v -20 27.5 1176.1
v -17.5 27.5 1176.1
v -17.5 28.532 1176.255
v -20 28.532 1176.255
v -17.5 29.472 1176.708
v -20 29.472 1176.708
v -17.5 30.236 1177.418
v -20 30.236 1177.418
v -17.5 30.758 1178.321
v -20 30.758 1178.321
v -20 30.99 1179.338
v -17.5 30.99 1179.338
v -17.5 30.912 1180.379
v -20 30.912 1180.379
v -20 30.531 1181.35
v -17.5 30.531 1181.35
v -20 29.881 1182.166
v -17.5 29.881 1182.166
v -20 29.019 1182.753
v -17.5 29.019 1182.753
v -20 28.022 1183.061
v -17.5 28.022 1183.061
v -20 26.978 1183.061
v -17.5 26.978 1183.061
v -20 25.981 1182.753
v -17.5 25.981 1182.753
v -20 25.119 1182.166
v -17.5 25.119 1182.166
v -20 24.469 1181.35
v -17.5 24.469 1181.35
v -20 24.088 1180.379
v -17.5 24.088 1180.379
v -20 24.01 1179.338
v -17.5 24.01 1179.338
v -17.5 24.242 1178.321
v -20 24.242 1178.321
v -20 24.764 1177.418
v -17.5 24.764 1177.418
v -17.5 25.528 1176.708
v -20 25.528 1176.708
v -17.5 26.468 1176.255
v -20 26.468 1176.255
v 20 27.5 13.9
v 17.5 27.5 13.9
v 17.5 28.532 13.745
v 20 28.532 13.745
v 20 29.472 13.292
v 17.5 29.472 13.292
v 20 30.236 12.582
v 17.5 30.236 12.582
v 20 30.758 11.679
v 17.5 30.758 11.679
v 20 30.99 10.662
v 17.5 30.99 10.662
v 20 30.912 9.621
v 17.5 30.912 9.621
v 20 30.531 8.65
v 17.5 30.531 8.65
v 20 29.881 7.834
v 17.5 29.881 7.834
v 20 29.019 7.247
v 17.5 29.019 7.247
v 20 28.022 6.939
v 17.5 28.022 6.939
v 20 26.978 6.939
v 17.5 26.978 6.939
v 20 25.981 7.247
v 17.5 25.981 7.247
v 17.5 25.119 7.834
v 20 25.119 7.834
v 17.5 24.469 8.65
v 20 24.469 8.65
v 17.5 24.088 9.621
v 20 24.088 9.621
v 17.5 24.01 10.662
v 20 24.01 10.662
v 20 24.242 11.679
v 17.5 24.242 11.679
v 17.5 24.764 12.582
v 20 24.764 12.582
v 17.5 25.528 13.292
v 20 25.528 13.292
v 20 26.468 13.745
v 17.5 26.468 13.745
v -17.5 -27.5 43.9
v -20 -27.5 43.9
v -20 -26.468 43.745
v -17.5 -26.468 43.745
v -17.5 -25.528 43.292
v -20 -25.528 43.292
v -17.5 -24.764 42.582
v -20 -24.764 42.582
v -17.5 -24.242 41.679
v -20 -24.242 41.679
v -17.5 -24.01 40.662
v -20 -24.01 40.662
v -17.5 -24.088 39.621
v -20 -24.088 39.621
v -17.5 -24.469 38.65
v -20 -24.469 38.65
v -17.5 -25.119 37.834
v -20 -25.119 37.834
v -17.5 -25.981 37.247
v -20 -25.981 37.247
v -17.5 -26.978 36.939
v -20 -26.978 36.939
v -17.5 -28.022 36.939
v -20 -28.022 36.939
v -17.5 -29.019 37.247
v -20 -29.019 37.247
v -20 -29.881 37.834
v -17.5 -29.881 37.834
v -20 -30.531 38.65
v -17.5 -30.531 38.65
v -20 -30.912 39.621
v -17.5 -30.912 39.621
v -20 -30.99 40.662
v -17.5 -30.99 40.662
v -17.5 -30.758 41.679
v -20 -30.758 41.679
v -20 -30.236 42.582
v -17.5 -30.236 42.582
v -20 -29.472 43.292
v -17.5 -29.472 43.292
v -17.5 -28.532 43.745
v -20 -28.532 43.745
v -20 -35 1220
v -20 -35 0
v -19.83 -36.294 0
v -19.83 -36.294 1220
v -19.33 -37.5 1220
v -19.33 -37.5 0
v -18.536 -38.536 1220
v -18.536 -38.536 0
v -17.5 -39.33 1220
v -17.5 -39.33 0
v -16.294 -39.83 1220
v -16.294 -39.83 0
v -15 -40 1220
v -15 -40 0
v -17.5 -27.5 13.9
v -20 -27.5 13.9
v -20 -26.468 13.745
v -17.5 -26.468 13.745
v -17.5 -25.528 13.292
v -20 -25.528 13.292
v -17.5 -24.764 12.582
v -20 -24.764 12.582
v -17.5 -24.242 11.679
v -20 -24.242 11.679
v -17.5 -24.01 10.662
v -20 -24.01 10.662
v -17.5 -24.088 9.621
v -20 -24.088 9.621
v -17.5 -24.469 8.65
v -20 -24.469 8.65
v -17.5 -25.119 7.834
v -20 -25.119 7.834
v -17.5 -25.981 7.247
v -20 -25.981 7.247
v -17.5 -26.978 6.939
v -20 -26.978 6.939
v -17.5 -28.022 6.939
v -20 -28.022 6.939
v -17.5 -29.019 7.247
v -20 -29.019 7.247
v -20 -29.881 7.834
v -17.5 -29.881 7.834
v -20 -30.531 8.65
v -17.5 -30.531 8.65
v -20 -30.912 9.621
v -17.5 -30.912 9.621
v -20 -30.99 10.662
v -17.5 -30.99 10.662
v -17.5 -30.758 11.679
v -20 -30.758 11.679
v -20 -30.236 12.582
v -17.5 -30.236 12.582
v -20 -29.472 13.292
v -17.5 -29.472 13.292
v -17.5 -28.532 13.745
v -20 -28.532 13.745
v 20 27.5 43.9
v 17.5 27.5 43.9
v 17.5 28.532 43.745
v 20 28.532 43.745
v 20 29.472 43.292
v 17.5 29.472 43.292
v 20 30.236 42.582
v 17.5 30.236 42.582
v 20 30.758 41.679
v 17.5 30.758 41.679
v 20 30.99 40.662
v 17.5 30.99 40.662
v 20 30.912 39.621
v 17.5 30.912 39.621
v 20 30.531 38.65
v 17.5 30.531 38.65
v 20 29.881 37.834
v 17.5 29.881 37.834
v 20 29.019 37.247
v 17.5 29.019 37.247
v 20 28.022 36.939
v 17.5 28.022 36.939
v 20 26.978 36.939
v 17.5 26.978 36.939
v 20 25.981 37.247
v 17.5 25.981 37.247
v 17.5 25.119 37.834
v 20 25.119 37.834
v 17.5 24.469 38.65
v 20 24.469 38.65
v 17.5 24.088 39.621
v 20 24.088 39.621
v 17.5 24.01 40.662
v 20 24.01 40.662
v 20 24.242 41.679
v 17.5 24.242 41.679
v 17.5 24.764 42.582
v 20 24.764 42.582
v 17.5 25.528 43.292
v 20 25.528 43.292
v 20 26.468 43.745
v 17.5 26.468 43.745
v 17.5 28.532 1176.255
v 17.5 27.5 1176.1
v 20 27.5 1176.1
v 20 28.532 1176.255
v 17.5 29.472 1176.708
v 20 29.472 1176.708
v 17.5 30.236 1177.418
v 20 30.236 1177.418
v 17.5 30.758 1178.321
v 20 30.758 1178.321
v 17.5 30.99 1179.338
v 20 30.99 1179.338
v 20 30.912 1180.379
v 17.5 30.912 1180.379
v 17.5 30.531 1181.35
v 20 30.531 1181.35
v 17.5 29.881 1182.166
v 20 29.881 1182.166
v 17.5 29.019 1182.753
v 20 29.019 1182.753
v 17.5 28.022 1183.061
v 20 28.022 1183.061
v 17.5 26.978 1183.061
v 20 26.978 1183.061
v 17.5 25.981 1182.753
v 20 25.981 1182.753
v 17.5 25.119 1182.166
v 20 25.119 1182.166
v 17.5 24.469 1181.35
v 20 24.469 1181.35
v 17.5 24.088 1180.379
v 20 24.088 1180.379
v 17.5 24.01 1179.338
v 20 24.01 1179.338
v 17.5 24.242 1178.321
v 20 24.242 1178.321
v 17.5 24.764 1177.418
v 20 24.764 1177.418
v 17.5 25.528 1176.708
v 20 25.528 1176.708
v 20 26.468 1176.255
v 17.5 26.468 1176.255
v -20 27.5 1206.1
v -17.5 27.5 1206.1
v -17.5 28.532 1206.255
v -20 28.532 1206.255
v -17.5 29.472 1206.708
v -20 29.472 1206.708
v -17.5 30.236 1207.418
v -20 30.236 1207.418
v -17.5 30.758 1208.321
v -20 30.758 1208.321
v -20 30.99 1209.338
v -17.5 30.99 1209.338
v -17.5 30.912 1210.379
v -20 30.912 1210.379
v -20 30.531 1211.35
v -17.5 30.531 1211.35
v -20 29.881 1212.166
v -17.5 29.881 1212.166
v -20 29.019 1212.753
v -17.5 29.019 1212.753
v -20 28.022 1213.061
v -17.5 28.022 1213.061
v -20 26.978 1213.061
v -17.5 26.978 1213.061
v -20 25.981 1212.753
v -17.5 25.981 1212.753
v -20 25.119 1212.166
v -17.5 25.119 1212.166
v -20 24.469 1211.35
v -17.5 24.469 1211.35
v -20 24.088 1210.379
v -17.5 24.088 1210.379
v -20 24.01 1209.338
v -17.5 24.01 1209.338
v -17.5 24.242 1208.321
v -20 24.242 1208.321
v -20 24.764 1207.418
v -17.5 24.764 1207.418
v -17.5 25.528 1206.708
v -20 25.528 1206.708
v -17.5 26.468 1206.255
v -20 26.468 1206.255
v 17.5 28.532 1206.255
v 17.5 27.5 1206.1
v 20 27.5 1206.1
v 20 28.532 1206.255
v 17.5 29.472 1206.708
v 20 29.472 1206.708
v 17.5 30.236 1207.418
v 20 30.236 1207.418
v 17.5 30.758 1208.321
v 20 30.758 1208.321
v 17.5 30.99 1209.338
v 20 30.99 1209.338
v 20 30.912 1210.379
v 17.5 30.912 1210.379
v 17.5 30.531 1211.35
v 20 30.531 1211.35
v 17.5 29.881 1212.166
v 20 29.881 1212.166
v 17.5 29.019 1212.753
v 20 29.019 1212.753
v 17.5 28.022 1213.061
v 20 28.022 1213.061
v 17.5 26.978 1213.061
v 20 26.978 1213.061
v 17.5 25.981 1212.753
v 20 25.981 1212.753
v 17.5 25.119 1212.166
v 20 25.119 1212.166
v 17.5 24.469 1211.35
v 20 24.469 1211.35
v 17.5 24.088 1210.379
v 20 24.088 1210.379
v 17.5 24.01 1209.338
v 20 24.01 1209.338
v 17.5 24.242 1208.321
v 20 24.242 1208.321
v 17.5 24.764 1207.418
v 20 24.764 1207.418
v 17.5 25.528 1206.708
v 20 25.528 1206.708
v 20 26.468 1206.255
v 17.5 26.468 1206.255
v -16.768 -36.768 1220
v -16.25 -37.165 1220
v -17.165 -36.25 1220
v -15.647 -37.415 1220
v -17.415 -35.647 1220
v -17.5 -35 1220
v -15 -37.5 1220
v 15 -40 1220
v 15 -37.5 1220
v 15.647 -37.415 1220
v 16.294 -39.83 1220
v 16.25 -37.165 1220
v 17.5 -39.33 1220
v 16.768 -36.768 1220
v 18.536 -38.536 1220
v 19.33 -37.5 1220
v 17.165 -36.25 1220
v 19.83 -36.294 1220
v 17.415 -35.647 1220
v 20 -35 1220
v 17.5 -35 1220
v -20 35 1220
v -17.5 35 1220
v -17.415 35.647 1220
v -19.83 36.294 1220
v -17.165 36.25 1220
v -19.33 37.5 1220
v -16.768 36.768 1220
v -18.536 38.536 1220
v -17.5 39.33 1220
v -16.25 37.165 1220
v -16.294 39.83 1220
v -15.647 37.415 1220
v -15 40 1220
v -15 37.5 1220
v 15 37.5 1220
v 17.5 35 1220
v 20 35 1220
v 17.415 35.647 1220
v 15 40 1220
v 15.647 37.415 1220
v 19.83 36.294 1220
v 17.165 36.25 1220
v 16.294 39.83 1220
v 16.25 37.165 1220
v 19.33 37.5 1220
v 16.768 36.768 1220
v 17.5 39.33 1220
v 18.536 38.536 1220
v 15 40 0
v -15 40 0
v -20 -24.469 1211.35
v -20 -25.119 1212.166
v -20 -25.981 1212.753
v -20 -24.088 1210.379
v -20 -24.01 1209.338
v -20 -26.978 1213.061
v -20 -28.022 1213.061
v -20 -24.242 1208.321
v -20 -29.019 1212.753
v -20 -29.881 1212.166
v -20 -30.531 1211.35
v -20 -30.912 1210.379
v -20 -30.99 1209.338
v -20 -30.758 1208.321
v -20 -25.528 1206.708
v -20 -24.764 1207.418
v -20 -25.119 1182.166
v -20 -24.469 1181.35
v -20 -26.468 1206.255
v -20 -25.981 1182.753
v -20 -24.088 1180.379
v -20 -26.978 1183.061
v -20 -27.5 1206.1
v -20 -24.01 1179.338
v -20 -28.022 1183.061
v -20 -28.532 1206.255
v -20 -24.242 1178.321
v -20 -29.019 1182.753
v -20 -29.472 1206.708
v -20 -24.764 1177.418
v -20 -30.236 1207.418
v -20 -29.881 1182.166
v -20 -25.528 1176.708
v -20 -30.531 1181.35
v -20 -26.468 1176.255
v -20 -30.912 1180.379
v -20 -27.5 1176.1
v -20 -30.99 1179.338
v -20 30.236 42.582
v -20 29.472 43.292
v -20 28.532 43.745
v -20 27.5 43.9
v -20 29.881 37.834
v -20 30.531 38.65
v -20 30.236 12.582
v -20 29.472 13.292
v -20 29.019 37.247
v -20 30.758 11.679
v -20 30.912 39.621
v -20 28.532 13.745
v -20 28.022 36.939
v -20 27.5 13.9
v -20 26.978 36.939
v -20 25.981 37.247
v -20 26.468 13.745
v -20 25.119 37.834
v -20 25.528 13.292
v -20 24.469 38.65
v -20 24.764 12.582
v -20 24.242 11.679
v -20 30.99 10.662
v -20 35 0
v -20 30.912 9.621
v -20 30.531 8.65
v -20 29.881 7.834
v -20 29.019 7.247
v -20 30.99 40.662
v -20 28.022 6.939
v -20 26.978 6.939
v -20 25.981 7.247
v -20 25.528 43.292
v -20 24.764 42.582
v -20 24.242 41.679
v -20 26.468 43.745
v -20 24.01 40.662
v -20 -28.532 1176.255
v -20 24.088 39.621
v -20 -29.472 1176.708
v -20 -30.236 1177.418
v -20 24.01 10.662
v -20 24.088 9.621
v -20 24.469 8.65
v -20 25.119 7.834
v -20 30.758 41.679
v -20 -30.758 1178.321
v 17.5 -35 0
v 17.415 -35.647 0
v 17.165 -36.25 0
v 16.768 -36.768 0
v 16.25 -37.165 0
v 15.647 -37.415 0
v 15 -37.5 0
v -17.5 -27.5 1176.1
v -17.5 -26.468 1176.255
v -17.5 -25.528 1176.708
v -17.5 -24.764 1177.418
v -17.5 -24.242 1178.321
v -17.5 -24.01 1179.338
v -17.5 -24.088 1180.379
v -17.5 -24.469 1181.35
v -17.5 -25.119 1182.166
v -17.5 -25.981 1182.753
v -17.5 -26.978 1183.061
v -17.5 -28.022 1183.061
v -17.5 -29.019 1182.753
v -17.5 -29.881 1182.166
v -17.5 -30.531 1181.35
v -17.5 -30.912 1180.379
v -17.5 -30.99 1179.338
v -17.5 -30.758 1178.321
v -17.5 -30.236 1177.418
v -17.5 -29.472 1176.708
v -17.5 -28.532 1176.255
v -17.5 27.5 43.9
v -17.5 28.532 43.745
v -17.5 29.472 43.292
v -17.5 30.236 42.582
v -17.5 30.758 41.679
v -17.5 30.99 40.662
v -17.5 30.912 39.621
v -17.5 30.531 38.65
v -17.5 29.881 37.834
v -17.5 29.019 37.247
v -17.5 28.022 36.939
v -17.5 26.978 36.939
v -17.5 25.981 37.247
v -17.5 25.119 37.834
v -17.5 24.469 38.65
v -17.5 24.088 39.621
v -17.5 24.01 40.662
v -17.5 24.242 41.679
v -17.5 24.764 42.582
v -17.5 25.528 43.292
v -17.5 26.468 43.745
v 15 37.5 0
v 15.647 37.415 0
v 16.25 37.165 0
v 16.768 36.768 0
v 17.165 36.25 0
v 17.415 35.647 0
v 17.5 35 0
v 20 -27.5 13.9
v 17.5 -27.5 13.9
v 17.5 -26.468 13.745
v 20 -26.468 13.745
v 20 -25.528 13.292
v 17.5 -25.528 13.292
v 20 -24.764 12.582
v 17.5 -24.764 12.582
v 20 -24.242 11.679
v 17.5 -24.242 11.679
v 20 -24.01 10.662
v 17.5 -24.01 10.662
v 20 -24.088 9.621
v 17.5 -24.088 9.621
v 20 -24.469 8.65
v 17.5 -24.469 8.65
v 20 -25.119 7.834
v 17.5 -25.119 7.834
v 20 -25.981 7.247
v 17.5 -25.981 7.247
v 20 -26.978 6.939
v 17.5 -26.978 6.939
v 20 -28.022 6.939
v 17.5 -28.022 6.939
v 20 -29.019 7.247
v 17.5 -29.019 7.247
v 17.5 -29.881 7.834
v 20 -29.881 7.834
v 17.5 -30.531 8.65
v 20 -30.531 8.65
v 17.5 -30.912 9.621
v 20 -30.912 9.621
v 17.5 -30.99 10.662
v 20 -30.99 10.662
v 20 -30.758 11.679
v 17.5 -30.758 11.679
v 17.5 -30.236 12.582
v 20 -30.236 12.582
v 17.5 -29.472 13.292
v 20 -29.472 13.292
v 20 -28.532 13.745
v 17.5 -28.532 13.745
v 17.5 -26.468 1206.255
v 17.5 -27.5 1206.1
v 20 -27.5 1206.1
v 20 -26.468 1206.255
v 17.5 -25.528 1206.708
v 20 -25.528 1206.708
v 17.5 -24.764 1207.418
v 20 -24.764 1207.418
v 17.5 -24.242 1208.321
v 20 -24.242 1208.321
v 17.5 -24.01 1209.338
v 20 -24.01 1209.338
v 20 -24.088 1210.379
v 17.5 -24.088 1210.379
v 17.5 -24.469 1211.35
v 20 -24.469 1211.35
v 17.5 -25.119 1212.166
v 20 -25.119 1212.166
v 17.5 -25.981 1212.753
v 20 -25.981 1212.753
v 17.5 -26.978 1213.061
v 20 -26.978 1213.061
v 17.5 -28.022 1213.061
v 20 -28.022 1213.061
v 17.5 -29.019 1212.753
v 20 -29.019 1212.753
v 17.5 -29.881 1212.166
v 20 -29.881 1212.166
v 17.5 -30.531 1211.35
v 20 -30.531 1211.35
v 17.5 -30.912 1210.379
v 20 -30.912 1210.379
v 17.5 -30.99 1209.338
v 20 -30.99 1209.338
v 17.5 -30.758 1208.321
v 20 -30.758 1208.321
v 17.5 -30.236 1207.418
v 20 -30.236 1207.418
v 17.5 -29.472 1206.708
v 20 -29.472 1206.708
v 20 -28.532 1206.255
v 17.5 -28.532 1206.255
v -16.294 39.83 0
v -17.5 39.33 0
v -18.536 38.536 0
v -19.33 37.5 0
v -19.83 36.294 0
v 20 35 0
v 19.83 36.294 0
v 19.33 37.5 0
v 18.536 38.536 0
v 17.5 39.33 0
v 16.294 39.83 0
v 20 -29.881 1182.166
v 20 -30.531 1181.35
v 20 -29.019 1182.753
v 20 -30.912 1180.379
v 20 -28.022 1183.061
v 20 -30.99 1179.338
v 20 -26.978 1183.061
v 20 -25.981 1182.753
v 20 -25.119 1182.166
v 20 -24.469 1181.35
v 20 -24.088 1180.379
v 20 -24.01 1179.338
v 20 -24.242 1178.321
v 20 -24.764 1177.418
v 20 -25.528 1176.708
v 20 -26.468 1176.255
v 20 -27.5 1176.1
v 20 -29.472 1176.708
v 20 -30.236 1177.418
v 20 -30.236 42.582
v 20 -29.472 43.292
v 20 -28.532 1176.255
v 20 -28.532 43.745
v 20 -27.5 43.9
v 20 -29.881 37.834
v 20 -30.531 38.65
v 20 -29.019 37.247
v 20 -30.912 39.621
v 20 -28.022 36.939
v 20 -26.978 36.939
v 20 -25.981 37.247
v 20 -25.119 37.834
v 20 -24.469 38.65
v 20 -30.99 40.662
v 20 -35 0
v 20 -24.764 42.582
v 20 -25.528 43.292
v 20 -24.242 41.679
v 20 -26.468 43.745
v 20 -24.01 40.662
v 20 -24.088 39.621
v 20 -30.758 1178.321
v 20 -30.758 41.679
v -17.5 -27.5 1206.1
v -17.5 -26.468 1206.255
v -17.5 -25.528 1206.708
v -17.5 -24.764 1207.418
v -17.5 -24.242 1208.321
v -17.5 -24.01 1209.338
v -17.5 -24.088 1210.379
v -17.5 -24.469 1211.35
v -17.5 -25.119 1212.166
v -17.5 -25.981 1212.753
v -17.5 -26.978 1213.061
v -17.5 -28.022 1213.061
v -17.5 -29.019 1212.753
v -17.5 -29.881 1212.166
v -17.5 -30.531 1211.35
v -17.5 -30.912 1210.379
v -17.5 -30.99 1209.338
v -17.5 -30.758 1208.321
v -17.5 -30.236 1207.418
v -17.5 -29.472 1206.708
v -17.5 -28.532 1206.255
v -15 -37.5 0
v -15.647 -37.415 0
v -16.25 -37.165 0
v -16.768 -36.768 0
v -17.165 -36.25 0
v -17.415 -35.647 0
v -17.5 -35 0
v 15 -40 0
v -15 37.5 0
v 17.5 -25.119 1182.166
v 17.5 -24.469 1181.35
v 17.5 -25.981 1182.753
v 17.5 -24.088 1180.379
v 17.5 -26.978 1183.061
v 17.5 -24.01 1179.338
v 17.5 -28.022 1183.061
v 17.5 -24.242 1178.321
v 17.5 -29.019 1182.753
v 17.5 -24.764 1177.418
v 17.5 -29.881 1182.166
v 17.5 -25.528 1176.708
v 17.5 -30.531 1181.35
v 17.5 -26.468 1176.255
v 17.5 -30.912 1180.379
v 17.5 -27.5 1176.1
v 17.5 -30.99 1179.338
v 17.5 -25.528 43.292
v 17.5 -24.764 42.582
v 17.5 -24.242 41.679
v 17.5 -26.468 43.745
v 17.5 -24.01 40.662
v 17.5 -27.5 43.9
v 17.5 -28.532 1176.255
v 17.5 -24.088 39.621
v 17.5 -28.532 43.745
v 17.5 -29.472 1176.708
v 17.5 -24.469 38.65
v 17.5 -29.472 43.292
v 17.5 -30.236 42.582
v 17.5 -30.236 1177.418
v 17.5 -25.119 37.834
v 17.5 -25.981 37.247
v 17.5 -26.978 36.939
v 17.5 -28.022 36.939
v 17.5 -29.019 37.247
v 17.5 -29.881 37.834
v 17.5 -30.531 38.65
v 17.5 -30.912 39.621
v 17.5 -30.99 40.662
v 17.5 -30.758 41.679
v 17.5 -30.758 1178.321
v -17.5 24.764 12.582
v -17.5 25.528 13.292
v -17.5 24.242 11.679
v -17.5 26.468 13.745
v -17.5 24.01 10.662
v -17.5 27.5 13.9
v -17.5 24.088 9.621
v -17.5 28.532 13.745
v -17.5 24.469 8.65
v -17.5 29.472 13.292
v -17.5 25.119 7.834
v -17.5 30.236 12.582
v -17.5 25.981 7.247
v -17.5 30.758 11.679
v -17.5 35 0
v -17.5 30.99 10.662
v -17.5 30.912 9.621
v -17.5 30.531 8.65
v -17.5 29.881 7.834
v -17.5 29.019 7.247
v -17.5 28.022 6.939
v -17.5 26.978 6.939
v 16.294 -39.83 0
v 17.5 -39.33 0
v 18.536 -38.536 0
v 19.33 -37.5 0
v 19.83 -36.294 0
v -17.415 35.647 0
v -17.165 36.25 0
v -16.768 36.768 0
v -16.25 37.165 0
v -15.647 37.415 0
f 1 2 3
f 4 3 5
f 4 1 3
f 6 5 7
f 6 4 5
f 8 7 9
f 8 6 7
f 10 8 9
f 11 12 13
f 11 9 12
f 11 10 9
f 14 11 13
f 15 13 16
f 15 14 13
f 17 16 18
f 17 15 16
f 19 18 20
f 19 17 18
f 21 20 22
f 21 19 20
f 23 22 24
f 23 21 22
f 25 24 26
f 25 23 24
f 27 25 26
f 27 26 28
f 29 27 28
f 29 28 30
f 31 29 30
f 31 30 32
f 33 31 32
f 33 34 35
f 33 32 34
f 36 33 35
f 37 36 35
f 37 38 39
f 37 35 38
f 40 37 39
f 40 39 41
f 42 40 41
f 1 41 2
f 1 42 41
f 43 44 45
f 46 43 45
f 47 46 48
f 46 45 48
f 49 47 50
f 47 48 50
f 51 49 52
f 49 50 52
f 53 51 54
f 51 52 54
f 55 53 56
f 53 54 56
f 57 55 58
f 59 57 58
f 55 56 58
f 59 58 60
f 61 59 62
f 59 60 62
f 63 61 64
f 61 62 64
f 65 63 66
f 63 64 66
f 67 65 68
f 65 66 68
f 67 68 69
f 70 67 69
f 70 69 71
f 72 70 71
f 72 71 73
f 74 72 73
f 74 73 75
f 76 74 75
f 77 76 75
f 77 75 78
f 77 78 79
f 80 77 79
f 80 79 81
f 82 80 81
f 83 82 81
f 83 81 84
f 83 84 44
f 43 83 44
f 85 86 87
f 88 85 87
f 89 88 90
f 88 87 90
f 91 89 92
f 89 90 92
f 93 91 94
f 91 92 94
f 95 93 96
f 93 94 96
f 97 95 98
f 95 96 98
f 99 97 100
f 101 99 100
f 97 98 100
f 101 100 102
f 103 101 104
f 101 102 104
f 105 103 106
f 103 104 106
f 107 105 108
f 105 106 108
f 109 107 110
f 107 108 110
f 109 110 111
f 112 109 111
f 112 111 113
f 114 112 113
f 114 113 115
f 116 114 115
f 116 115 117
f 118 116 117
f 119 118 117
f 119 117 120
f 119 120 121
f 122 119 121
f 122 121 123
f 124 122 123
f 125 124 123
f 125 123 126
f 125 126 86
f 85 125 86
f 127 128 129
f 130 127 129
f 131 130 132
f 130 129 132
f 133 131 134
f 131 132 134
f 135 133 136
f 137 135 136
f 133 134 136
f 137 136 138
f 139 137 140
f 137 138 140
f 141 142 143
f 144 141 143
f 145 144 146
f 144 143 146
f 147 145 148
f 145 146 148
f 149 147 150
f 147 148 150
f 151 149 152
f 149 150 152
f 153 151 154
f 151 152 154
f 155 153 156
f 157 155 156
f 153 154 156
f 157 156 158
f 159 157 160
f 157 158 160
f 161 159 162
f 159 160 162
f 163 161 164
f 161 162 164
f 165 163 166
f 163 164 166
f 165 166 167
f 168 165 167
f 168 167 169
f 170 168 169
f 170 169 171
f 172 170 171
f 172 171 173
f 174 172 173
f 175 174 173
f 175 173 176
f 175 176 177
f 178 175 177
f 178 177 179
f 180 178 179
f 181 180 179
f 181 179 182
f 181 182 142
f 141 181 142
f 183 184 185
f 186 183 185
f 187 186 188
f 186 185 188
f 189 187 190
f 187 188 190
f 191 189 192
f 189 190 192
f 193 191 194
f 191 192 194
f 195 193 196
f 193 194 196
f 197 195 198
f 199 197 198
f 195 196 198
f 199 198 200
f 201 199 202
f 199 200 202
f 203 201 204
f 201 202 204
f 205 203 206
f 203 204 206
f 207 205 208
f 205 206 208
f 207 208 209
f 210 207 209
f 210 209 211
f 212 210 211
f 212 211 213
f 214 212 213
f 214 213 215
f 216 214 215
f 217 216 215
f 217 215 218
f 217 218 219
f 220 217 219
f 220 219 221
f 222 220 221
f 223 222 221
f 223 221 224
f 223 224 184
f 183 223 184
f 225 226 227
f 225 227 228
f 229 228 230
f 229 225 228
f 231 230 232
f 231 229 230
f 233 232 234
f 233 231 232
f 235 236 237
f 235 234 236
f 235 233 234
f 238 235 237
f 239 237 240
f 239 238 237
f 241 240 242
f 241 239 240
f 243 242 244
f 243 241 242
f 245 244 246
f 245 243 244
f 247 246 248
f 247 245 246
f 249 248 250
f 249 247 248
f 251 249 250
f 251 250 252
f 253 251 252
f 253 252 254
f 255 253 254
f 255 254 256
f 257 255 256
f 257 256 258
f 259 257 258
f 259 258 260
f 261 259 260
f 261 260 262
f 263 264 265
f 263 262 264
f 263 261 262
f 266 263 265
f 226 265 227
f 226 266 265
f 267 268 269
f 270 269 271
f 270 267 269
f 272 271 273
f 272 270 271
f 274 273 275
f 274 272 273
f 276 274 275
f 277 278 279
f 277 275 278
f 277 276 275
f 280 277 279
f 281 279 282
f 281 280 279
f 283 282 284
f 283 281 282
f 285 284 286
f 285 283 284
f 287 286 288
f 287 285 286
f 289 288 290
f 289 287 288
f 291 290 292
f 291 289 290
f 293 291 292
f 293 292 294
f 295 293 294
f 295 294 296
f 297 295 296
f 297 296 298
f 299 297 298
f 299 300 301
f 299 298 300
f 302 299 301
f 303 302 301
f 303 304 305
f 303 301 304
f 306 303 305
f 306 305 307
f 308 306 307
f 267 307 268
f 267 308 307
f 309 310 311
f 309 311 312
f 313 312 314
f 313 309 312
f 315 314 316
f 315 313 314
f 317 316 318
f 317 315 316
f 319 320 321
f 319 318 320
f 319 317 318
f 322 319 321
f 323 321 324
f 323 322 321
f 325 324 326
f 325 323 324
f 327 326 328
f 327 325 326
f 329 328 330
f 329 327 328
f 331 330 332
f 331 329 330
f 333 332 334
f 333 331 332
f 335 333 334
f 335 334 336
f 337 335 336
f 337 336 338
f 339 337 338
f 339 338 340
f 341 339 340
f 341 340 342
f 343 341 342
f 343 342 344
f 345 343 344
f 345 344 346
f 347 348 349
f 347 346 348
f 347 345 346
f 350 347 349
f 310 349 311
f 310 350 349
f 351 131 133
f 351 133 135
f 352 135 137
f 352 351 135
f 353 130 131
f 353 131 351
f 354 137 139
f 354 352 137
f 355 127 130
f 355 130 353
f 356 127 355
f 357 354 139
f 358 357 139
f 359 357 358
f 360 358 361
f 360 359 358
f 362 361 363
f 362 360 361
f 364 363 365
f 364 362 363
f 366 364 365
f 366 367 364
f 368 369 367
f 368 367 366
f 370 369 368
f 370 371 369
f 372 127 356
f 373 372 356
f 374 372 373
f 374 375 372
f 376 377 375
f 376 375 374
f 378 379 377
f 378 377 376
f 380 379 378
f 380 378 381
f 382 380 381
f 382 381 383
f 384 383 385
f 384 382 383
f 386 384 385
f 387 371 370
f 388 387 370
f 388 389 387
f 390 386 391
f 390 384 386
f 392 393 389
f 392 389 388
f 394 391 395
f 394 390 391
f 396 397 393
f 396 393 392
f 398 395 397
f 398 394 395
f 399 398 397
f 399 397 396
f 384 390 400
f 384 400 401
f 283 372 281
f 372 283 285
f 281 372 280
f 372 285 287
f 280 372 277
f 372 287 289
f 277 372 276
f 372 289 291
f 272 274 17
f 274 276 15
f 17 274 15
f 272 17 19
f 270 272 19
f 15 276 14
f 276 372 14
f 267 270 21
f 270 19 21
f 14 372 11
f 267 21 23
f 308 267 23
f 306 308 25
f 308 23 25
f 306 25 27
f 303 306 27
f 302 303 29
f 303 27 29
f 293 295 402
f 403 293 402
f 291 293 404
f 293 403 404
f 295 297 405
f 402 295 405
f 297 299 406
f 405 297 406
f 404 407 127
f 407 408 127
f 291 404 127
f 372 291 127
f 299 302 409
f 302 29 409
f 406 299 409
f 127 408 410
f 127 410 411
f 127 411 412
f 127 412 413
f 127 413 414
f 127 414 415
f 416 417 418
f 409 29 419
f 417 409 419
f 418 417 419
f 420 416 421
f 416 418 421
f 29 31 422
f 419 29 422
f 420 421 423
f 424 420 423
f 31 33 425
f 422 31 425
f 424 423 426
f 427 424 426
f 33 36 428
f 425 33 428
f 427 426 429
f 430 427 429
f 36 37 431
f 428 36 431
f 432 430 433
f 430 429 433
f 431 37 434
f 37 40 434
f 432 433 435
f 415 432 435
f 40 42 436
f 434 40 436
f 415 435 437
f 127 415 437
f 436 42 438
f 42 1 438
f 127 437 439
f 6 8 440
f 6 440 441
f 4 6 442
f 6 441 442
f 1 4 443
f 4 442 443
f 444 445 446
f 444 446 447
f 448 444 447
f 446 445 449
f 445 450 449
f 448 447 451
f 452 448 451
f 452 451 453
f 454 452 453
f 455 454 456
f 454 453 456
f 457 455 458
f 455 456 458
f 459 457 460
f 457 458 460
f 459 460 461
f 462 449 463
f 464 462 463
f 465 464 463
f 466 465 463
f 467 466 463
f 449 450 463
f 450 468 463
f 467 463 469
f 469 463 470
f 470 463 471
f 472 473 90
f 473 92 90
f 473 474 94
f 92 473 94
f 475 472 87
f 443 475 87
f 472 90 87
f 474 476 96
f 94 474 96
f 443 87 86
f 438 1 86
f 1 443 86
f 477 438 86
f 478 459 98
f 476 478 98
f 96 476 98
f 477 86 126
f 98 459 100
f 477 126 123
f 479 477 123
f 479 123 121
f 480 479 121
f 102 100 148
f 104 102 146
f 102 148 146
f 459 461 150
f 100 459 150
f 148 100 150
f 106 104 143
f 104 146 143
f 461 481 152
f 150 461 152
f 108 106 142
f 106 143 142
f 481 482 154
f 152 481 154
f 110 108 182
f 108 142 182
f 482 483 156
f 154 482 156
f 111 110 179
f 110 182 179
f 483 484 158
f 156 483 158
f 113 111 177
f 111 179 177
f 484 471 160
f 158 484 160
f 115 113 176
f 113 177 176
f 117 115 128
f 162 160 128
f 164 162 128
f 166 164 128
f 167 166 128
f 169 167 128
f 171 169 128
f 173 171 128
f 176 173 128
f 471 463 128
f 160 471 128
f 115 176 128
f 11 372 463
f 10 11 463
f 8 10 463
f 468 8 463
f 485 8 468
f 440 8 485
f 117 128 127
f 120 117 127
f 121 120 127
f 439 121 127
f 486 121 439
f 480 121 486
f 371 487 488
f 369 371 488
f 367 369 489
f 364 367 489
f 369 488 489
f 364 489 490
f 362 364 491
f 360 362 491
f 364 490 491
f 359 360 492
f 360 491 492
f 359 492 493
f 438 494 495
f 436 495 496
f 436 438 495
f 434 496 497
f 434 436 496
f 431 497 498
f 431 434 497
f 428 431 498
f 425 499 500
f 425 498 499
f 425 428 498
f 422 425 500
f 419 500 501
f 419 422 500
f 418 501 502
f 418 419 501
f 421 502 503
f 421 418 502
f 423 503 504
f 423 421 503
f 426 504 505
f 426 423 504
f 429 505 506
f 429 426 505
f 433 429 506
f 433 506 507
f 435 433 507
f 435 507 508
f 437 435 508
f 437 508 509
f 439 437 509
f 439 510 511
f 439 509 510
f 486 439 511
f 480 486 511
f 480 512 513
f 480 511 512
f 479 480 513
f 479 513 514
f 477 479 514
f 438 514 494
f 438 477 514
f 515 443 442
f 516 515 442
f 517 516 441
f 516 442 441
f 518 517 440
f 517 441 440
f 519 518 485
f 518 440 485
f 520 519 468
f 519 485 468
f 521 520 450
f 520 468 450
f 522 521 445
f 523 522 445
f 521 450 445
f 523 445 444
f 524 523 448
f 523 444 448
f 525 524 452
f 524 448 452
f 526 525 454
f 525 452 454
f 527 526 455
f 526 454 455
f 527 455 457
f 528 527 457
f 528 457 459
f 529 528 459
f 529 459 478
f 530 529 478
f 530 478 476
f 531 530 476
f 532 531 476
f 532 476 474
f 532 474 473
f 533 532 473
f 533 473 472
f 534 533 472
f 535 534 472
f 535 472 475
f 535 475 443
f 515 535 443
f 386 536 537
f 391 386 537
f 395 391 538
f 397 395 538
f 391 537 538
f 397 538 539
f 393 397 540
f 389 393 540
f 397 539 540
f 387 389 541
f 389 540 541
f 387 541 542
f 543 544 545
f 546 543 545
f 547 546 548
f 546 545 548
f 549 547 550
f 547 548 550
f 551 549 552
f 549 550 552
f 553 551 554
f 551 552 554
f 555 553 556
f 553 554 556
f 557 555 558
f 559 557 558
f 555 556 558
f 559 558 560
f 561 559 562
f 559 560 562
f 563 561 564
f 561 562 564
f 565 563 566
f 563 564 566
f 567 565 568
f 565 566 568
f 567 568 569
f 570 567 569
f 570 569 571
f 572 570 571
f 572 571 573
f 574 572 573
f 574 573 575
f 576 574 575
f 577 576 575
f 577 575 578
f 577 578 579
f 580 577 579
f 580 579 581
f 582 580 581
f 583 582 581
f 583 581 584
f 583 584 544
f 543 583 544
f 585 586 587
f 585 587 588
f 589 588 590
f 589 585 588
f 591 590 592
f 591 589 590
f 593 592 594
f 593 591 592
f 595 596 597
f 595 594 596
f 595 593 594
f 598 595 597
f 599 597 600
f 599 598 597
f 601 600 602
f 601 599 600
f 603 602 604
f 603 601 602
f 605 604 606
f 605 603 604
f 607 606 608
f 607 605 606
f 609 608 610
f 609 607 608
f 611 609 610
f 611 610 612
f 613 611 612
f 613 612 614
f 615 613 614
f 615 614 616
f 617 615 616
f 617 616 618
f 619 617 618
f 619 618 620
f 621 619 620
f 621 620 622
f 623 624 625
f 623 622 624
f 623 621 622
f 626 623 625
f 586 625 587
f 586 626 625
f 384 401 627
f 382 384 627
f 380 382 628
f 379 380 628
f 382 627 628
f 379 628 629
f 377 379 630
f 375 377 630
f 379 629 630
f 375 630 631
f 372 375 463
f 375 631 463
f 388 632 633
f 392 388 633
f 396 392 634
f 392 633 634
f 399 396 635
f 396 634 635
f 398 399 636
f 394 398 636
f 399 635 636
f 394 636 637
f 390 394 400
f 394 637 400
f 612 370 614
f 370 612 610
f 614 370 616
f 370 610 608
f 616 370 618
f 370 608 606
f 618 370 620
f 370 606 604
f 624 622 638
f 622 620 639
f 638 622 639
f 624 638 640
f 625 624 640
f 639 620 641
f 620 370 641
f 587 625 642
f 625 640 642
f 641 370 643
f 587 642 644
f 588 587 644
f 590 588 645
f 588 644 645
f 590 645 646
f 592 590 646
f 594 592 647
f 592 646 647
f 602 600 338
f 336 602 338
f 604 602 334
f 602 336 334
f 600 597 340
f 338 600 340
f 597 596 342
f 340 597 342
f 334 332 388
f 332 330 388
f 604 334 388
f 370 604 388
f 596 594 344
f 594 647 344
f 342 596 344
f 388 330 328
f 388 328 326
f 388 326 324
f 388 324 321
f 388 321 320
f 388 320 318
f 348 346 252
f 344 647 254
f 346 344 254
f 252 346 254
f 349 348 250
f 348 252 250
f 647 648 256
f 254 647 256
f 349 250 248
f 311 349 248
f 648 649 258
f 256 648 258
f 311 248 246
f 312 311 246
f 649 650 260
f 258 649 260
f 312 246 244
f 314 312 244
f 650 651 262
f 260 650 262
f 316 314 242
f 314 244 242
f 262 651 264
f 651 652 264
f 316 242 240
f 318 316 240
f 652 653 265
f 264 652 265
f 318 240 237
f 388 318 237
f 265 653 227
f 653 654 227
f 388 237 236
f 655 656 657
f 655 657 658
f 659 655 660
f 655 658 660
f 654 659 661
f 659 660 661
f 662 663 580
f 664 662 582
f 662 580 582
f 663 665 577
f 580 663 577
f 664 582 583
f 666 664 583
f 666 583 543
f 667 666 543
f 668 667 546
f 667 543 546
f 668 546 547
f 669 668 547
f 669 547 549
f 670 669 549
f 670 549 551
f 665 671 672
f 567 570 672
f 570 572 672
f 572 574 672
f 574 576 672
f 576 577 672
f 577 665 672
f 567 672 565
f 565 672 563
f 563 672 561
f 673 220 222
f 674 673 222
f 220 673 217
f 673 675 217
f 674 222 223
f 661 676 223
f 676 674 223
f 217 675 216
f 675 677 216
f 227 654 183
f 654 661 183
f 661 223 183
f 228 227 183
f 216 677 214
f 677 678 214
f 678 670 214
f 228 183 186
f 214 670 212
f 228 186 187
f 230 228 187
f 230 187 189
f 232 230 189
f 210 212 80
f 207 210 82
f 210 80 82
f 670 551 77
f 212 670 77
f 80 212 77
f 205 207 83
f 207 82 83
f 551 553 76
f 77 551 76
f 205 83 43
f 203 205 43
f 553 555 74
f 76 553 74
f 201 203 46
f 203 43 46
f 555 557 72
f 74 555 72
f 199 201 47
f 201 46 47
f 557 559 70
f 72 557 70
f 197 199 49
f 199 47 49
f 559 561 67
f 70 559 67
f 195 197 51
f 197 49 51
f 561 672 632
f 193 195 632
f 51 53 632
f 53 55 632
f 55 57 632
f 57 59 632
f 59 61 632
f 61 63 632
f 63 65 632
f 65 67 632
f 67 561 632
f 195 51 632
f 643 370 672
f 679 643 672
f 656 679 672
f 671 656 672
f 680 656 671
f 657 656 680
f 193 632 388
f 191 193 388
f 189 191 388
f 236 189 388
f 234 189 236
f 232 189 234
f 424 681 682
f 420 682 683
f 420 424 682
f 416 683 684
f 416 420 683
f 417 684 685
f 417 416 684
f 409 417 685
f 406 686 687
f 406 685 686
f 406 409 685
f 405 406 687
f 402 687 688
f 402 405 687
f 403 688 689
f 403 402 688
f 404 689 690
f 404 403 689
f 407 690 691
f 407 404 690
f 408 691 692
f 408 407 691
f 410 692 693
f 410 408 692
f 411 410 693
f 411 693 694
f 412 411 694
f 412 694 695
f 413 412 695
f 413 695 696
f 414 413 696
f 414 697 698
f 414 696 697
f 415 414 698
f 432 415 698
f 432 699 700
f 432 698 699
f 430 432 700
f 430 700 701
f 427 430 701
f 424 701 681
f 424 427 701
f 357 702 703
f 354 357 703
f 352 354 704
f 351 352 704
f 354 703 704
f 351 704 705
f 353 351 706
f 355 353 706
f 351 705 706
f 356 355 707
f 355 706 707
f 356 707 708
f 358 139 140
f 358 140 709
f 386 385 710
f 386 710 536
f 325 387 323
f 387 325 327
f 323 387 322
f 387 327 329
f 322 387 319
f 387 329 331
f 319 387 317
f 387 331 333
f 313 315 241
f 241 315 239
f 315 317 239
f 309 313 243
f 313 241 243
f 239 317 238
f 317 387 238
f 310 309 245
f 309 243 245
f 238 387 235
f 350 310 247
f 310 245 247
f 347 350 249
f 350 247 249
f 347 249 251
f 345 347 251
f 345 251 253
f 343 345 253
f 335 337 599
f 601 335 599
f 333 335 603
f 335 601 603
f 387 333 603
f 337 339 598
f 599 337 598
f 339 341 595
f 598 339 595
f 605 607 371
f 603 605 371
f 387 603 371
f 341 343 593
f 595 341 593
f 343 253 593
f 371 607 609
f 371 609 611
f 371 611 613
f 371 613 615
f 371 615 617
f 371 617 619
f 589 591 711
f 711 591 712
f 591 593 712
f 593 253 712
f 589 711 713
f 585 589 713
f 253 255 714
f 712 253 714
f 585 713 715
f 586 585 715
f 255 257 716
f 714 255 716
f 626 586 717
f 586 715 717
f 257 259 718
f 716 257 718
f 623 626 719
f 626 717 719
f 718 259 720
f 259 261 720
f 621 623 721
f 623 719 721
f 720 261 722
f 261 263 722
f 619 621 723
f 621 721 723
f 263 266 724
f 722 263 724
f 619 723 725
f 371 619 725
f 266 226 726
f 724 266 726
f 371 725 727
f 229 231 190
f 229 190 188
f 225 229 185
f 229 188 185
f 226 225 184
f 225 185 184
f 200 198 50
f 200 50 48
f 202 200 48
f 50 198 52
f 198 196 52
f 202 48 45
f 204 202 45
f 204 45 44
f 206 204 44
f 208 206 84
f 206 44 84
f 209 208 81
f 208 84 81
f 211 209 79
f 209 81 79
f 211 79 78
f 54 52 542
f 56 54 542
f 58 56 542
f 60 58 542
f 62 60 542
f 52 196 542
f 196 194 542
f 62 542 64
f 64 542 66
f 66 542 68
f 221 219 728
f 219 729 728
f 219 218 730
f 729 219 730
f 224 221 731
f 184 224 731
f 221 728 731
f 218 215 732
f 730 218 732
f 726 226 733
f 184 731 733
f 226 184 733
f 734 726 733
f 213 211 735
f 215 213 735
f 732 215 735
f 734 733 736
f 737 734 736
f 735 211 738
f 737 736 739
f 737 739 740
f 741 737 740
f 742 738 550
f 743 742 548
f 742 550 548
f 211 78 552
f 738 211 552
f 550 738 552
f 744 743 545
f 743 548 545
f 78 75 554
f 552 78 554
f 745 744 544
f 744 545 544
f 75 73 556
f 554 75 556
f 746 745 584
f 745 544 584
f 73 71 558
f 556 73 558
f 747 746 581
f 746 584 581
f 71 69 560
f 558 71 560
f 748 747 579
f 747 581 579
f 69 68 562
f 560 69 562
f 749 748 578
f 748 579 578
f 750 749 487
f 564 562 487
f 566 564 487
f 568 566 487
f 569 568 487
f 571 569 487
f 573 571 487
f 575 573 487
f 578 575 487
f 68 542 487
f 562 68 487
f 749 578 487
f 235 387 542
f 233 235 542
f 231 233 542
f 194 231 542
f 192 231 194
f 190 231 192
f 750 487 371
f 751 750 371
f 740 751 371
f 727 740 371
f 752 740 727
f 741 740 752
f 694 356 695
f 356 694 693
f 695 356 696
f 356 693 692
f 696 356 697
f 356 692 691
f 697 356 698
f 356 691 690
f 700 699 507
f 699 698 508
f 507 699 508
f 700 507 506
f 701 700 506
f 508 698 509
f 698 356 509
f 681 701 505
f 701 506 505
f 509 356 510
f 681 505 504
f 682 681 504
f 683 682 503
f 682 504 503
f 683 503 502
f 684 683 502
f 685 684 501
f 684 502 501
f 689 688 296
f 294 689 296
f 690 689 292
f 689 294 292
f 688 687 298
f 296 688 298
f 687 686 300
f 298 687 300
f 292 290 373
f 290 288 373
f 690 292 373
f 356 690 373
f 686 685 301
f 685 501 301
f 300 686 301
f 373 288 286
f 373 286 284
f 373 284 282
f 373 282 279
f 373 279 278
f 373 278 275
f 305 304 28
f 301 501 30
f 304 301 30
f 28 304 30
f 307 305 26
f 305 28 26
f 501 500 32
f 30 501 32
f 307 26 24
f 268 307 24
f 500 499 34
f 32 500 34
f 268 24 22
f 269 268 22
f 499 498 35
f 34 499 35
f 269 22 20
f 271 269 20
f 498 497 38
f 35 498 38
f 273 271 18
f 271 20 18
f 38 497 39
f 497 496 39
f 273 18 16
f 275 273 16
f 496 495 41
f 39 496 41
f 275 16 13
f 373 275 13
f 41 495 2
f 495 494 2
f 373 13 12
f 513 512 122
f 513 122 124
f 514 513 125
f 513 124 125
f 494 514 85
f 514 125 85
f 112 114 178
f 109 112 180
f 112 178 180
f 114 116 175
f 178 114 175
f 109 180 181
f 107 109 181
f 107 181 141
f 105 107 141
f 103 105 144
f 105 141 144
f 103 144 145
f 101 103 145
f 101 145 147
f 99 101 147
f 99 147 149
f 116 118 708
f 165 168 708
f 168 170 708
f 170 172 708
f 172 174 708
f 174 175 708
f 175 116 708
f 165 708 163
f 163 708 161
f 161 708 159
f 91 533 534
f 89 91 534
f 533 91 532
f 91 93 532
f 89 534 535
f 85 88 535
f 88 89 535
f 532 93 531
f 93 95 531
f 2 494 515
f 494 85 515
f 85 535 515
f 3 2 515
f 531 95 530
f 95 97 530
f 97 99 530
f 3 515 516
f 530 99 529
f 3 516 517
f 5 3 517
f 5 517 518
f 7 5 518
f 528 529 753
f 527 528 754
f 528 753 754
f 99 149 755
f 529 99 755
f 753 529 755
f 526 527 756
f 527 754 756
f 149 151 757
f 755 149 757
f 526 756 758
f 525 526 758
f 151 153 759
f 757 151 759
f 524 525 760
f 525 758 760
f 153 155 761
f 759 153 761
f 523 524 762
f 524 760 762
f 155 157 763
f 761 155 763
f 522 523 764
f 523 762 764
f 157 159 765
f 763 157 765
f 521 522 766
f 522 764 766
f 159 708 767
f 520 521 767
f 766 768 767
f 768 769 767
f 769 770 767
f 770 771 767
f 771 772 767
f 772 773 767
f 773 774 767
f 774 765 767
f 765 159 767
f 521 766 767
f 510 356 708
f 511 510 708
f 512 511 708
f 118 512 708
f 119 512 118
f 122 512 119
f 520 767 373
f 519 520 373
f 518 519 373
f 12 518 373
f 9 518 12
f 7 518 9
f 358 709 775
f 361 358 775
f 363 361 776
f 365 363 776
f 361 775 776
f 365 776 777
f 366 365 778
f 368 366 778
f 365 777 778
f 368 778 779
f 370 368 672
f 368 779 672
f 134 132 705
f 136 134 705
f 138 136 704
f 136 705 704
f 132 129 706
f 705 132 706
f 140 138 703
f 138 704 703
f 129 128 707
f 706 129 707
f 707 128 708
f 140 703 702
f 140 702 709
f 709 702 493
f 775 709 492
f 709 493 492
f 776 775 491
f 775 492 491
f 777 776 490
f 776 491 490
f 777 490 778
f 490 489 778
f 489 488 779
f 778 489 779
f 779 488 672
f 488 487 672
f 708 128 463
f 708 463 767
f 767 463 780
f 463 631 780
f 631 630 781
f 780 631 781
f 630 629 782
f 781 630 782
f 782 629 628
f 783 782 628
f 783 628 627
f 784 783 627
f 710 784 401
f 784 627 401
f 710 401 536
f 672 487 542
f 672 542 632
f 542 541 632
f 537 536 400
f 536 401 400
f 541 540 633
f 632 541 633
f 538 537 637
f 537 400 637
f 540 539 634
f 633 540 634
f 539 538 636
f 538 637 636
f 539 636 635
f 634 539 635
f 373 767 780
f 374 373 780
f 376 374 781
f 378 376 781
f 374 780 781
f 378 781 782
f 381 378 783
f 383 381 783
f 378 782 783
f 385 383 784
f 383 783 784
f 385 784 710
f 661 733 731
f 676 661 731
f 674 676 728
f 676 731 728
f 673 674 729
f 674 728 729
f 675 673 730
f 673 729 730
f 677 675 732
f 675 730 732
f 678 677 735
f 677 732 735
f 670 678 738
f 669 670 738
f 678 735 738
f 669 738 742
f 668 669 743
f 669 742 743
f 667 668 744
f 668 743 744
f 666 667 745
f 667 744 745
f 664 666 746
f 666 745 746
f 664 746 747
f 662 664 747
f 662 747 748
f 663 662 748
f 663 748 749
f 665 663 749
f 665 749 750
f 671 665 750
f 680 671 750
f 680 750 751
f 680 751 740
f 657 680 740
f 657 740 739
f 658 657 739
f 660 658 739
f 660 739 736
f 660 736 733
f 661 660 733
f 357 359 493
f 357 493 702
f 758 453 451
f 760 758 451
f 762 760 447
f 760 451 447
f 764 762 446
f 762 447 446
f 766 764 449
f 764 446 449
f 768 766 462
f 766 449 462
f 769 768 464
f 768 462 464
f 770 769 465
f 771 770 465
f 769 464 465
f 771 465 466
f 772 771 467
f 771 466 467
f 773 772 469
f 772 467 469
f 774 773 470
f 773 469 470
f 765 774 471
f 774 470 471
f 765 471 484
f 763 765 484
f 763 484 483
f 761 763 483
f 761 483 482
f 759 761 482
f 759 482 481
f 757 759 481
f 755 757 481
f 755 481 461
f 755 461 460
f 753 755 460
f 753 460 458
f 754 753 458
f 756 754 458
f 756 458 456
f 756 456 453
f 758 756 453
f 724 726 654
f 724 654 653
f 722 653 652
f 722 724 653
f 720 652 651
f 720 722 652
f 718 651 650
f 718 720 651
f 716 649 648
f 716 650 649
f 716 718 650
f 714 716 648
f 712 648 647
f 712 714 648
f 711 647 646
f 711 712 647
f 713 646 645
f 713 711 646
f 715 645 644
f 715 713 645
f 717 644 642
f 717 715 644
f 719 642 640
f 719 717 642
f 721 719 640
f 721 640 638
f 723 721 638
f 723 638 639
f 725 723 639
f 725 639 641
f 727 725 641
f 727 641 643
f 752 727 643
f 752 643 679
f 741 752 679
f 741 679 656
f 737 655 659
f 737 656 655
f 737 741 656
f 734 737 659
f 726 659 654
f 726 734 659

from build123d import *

# Parameters (mm, degrees)
BOSS_EXTRUDE1_DEPTH = 1220
SKETCH2_R           = 3.5
CUT_EXTRUDE1_DEPTH  = 41


with BuildPart() as part:
    # Sketch1 → Boss-Extrude1 (new body)
    with BuildSketch(Plane.XY):
        with BuildLine():
            Line((-15, -40), (15, -40))
            ThreePointArc((15, -40), (18.535533906, -38.535533906), (20, -35))
            Line((20, -35), (20, 35))
            ThreePointArc((20, 35), (18.535533906, 38.535533906), (15, 40))
            Line((15, 40), (-15, 40))
            ThreePointArc((-15, 40), (-18.535533906, 38.535533906), (-20, 35))
            Line((-20, 35), (-20, -35))
            ThreePointArc((-20, -35), (-18.535533906, -38.535533906), (-15, -40))
        make_face()
        with BuildLine():
            Line((-17.5, -35), (-17.5, 35))
            ThreePointArc((-17.5, 35), (-16.767766953, 36.767766953), (-15, 37.5))
            Line((-15, 37.5), (15, 37.5))
            ThreePointArc((15, 37.5), (16.767766953, 36.767766953), (17.5, 35))
            Line((17.5, 35), (17.5, -35))
            ThreePointArc((17.5, -35), (16.767766953, -36.767766953), (15, -37.5))
            Line((15, -37.5), (-15, -37.5))
            ThreePointArc((-15, -37.5), (-16.767766953, -36.767766953), (-17.5, -35))
        make_face(mode=Mode.SUBTRACT)
    extrude(amount=BOSS_EXTRUDE1_DEPTH)

    # Sketch2 → Cut-Extrude1 (cut, through all)
    with BuildSketch(Plane.ZY.offset(20)):
        with Locations((10.4, 27.5)):
            Circle(SKETCH2_R)
        with Locations((40.4, 27.5)):
            Circle(SKETCH2_R)
        with Locations((40.4, -27.5)):
            Circle(SKETCH2_R)
        with Locations((10.4, -27.5)):
            Circle(SKETCH2_R)
    cut_extrude1 = extrude(amount=-CUT_EXTRUDE1_DEPTH, mode=Mode.SUBTRACT)

    # Mirror1: Cut-Extrude1 across plane
    add(cut_extrude1.mirror(Plane.XY.offset(610)), mode=Mode.SUBTRACT)


solid = part.part
